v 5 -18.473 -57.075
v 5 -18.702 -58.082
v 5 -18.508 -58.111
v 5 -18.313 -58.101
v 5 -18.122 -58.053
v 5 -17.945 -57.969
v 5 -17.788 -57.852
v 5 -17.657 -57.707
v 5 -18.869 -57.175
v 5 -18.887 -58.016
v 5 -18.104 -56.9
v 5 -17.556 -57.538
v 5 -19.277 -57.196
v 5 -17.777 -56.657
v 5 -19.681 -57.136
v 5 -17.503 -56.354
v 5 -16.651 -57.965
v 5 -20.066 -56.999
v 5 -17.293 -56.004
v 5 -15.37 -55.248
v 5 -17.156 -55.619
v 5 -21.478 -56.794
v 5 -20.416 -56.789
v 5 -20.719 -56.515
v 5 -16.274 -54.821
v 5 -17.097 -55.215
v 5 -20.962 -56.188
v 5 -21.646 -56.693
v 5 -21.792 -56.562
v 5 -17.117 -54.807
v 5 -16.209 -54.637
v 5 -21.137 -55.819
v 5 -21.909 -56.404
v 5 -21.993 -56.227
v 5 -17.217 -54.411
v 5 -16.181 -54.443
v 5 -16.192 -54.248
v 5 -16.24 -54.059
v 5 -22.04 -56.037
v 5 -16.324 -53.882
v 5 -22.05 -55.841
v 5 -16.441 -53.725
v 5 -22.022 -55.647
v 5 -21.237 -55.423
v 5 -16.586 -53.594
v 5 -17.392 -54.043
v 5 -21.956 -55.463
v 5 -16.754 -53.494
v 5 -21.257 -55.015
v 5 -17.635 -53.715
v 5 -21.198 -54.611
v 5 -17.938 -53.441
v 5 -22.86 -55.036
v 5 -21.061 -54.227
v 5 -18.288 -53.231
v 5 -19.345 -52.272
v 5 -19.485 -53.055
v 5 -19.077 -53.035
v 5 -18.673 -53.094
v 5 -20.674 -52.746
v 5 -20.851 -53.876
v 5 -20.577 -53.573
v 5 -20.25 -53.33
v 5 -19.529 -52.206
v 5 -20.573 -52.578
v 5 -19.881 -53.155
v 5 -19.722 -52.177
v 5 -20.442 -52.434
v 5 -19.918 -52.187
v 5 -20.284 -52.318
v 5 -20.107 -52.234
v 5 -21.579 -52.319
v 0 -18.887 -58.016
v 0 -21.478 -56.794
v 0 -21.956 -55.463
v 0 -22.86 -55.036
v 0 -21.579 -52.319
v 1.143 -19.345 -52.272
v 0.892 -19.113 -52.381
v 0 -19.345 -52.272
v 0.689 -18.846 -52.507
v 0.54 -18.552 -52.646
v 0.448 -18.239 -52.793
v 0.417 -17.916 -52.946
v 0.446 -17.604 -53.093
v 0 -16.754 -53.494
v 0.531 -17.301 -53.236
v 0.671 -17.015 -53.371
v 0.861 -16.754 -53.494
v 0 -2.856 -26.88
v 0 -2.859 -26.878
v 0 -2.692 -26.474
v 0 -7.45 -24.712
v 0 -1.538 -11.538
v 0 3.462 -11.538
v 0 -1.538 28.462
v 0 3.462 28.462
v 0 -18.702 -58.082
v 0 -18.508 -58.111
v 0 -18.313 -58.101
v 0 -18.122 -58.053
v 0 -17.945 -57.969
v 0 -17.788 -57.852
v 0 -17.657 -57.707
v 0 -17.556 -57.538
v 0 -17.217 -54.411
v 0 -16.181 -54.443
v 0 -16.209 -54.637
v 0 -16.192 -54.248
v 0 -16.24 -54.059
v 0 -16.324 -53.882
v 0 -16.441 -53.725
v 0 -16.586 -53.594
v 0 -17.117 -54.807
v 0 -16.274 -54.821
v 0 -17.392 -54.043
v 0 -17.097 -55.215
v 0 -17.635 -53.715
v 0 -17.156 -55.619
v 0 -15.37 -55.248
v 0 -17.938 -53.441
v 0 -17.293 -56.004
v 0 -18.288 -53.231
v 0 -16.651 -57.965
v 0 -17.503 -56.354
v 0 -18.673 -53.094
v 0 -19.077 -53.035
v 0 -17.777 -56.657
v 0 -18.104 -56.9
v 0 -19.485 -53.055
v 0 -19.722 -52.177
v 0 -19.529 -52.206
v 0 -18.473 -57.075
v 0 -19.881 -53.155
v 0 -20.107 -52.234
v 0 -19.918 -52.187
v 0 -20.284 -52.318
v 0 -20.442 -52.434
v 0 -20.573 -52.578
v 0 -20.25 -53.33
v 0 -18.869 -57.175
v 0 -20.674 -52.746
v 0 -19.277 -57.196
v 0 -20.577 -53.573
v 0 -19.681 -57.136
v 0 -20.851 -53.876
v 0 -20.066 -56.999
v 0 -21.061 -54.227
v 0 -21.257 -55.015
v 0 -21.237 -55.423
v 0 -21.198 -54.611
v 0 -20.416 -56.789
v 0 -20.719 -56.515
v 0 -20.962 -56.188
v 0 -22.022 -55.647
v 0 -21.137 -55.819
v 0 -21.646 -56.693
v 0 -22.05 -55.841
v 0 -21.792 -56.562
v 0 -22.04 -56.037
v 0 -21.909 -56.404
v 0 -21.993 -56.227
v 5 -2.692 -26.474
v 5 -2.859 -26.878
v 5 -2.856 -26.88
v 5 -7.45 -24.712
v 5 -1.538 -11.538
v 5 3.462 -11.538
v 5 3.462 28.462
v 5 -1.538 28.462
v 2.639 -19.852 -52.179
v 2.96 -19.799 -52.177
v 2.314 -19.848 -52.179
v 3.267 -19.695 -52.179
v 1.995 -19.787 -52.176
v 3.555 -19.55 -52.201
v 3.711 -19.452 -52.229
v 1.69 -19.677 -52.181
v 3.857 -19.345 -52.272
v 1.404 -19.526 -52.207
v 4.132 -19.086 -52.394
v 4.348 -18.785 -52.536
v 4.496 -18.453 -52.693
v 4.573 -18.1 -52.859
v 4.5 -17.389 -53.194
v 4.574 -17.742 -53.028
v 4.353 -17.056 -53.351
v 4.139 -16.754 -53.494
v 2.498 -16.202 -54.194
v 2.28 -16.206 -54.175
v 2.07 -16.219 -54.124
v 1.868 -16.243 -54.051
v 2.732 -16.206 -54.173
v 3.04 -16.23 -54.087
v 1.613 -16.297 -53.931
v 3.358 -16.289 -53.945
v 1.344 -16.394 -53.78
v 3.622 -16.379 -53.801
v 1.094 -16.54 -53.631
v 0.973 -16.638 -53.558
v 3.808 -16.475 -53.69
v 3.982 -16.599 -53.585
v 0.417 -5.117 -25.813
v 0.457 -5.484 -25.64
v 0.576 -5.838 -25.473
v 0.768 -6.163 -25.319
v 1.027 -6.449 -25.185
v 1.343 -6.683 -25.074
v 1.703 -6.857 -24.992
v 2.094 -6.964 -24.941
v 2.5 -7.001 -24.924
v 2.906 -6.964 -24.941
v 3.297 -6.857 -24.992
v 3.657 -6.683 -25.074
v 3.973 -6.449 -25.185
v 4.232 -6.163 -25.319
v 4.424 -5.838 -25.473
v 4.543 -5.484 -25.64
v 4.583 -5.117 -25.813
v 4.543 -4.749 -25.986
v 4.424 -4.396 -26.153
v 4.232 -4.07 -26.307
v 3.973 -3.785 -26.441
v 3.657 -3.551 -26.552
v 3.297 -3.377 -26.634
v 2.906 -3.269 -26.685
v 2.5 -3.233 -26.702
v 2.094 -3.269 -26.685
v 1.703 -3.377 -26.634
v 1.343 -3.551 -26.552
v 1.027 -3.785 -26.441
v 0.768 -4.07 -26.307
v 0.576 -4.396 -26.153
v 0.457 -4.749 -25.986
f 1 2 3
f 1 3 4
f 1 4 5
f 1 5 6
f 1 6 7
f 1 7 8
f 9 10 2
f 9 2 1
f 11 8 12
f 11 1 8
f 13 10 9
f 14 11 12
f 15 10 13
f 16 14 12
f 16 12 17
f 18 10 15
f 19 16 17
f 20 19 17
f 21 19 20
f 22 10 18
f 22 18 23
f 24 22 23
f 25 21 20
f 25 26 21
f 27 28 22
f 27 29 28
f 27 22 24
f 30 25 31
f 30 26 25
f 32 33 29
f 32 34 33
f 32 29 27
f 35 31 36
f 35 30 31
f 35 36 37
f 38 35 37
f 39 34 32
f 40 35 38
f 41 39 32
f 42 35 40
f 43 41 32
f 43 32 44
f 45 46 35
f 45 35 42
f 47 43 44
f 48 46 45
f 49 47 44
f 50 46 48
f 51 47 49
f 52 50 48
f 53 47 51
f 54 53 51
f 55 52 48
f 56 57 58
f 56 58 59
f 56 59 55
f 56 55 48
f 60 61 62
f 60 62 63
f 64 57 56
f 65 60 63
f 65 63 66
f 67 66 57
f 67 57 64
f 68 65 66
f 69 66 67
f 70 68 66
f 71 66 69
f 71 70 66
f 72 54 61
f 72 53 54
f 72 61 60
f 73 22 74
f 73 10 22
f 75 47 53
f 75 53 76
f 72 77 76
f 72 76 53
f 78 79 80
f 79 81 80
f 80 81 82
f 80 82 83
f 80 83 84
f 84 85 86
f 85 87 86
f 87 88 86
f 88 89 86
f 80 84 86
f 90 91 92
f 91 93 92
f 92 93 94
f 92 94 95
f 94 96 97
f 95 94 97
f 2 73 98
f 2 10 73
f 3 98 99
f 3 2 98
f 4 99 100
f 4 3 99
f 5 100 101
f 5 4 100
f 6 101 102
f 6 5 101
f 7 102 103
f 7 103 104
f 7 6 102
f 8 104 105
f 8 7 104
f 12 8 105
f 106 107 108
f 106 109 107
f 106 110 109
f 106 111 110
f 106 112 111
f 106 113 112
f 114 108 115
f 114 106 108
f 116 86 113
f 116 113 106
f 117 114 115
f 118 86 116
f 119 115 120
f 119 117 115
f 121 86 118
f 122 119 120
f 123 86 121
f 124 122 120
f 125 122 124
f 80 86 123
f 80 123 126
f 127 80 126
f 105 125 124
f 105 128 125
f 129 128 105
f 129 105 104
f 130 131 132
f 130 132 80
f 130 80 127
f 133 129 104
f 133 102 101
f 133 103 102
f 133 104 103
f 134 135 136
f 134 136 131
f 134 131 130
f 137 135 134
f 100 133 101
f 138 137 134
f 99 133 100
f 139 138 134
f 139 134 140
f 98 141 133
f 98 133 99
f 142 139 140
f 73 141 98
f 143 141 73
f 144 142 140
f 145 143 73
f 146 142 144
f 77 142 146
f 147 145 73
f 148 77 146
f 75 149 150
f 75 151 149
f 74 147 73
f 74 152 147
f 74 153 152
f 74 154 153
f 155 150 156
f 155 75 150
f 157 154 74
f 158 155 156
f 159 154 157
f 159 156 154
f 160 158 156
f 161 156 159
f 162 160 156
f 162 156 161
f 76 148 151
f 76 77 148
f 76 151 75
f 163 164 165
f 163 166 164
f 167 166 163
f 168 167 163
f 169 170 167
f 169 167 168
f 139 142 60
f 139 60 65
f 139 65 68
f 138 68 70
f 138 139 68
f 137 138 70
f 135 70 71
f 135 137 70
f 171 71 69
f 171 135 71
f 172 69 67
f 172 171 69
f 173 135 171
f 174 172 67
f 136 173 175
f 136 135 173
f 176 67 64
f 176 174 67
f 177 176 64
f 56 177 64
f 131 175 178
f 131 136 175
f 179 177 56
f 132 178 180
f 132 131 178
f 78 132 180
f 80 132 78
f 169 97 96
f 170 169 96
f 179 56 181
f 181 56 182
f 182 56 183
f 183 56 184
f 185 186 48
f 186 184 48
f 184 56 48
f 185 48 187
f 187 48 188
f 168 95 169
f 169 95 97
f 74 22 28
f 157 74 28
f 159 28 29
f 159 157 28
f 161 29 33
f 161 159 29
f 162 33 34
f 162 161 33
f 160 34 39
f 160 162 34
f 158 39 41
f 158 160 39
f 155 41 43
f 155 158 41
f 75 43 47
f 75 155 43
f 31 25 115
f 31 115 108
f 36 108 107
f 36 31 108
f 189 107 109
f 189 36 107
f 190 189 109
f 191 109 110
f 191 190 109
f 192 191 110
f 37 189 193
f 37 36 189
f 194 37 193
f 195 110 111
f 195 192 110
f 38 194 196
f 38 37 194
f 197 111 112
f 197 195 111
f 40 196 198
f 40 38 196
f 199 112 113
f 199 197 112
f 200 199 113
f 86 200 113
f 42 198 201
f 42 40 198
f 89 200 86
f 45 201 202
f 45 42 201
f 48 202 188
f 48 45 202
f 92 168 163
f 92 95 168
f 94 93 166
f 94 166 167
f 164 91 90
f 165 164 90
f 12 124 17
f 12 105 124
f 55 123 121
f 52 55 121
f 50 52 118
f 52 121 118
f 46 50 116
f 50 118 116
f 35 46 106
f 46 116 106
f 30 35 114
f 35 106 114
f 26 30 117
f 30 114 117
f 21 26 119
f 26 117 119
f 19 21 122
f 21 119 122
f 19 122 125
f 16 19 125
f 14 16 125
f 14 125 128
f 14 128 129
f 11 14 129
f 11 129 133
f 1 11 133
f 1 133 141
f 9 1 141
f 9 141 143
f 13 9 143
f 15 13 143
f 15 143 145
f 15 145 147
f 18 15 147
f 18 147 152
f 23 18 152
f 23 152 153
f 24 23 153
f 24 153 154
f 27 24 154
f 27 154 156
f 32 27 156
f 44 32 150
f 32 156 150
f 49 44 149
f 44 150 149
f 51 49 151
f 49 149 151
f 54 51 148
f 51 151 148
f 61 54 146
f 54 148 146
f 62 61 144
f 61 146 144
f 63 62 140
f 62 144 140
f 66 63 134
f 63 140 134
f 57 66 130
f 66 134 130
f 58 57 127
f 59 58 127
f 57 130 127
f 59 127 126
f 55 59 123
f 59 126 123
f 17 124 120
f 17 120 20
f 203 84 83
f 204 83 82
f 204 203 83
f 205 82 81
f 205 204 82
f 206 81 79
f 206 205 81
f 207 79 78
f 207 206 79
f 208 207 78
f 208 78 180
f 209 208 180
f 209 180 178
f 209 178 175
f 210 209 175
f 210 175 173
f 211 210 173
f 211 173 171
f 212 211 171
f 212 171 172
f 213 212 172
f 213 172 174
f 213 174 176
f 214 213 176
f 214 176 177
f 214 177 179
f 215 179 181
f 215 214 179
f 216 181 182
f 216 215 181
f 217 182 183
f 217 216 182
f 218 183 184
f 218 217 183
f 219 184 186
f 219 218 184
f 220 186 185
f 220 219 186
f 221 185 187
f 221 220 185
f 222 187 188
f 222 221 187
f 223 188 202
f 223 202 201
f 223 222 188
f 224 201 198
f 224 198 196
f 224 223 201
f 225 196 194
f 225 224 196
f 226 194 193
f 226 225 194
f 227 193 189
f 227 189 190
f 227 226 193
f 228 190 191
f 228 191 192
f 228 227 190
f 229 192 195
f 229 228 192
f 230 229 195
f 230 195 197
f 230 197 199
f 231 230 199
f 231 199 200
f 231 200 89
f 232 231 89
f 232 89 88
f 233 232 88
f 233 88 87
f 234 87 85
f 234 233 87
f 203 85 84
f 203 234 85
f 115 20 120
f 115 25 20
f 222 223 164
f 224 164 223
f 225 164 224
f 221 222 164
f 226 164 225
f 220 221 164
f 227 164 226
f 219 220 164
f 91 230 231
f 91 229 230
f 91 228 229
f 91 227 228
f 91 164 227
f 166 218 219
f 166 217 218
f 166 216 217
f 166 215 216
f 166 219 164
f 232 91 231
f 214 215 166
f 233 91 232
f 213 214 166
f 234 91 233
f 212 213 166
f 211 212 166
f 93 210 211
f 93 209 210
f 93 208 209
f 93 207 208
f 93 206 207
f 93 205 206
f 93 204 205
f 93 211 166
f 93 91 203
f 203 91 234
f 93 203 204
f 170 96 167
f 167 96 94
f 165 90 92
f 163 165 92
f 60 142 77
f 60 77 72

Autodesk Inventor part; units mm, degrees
ref_plane "YZ Plane" through (0, 0, 0) normal (1, 0, 0) x (0, 1, 0)
ref_plane "XZ Plane" through (0, 0, 0) normal (0, 1, 0) x (-1, 0, 0)
ref_plane "XY Plane" through (0, 0, 0) normal (0, 0, 1) x (1, 0, 0)
sketch "Sketch1" plane through (0, 0, 0) normal (1, 0, 0) x (0, 1, 0)
  line L0 (3.4615, 28.4615) -> (-1.5385, 28.4615)
  line L1 (-1.5385, 28.4615) -> (-1.5385, -11.5385)
  line L2 (-1.5385, -11.5385) -> (3.4615, -11.5385)
  line L3 (3.4615, -11.5385) -> (3.4615, 28.4615)
  line L4 (3.4615, -11.5385) -> (-2.6923, -26.4744)
  line L5 (-2.8588, -26.8784) -> (-2.8558, -26.8796)
  line L6 (-2.8558, -26.8796) -> (-2.6923, -26.4744)
  line L7 (-2.8558, -26.8796) -> (-7.4503, -24.7123)
  line L8 (-7.4503, -24.7123) -> (-1.5385, -11.5385)
  point P0 (0, 0)
  dimension "d0" = 5
  dimension "d1" = 5.08
  dimension "d21" = 40
extrude "Extrusion1" add sketch "Sketch1" along normal blind 5
sketch "Sketch2" plane through (5, -2.8558, -26.8796) normal (0, -0.426635, -0.9044239) x (-1, 0, 0)
  circle A0 centre (2.5, -2.5) radius 2.0828
  line L0 (5, -5.08) -> (5, 0) projected
  line L1 (5, 0) -> (0, 0) projected
  point P0 (5, -8.885)
  dimension "d4" = 4.1656
  dimension "d5" = 2.5
  dimension "d6" = 2.5
extrude "Extrusion2" add sketch "Sketch2" along normal blind 30
sketch "Sketch7" plane through (2.5, -17.9159, -52.9458) normal (0, -0.426635, -0.9044239) x (-1, 0, 0)
  line L0 (2.5, -2.58) -> (-2.5, -2.58) projected
  line L1 (-2.5, 2.2849) -> (2.5, 2.2849)
  line L2 (2.5, 2.2849) -> (2.5, -2.58)
  line L3 (2.5, -2.58) -> (-2.5, -2.58)
  line L4 (-2.5, -2.58) -> (-2.5, 2.2849)
  point P0 (2.5, -6.385)
extrude "Extrusion3" add sketch "Sketch7" along normal blind 5
sketch "Sketch8" plane through (0, -20.2493, -51.8451) normal (-1, 0, 0) x (0, 0.426635, 0.9044239)
  circle A0 centre (-2.5, 2.3649) radius 2.0828
  line L0 (-5, 0) -> (-5, 4.8649) projected
  line L1 (0, 4.8649) -> (-5, 4.8649) projected
  point P0 (55.529, -3.805)
  dimension "d13" = 4.1656
  dimension "d14" = 2.5
  dimension "d15" = 2.5
extrude "Extrusion4" cut sketch "Sketch8" against normal blind 15
thread "Thread1" size "8-32 UNC" class "2B" standard "ANSI Unified Screw Threads" full length
fillet "Fillet1" radius 1 4 edges at (2.5, -22.3825, -56.3672) (2.5, -17.9826, -58.4427) (2.5, -15.8494, -53.9206) (2.5, -20.2493, -51.8451)
sketch "Sketch9" plane through (0, -20.6759, -52.7495) normal (0, -0.9044239, 0.426635) x (1, 0, 0)
  line L0 (0, -3.5828) -> (0, 0.5828) projected
  line L1 (5, 0) -> (5, -3) projected
  line L2 (0, 0.004) -> (5, 0.004)
  line L3 (5, 0.004) -> (5, -3)
  line L4 (5, -3) -> (0, -3)
  line L5 (0, -3) -> (0, 0.004)
  point P0 (0, 56.529)
extrude "Extrusion5" add sketch "Sketch9" along normal blind 1
sketch "Sketch10" plane through (0, -16.276, -54.825) normal (0, 0.9044239, -0.426635) x (1, 0, 0)
  point P0 (0, -56.529)
sketch "Sketch11" plane through (0, -16.276, -54.825) normal (0, 0.9044239, -0.426635) x (1, 0, 0)
  line L0 (5, -0.004) -> (5, -1) projected
  line L1 (0, 0) -> (0, 3) projected
  line L2 (5, -0.004) -> (0, -0.004)
  line L3 (0, -0.004) -> (0, 3)
  line L4 (0, 3) -> (5, 3)
  line L5 (5, 3) -> (5, -0.004)
  point P0 (0, -56.529)
extrude "Extrusion6" add sketch "Sketch11" along normal blind 1
properties part number "Fingers IPT"
